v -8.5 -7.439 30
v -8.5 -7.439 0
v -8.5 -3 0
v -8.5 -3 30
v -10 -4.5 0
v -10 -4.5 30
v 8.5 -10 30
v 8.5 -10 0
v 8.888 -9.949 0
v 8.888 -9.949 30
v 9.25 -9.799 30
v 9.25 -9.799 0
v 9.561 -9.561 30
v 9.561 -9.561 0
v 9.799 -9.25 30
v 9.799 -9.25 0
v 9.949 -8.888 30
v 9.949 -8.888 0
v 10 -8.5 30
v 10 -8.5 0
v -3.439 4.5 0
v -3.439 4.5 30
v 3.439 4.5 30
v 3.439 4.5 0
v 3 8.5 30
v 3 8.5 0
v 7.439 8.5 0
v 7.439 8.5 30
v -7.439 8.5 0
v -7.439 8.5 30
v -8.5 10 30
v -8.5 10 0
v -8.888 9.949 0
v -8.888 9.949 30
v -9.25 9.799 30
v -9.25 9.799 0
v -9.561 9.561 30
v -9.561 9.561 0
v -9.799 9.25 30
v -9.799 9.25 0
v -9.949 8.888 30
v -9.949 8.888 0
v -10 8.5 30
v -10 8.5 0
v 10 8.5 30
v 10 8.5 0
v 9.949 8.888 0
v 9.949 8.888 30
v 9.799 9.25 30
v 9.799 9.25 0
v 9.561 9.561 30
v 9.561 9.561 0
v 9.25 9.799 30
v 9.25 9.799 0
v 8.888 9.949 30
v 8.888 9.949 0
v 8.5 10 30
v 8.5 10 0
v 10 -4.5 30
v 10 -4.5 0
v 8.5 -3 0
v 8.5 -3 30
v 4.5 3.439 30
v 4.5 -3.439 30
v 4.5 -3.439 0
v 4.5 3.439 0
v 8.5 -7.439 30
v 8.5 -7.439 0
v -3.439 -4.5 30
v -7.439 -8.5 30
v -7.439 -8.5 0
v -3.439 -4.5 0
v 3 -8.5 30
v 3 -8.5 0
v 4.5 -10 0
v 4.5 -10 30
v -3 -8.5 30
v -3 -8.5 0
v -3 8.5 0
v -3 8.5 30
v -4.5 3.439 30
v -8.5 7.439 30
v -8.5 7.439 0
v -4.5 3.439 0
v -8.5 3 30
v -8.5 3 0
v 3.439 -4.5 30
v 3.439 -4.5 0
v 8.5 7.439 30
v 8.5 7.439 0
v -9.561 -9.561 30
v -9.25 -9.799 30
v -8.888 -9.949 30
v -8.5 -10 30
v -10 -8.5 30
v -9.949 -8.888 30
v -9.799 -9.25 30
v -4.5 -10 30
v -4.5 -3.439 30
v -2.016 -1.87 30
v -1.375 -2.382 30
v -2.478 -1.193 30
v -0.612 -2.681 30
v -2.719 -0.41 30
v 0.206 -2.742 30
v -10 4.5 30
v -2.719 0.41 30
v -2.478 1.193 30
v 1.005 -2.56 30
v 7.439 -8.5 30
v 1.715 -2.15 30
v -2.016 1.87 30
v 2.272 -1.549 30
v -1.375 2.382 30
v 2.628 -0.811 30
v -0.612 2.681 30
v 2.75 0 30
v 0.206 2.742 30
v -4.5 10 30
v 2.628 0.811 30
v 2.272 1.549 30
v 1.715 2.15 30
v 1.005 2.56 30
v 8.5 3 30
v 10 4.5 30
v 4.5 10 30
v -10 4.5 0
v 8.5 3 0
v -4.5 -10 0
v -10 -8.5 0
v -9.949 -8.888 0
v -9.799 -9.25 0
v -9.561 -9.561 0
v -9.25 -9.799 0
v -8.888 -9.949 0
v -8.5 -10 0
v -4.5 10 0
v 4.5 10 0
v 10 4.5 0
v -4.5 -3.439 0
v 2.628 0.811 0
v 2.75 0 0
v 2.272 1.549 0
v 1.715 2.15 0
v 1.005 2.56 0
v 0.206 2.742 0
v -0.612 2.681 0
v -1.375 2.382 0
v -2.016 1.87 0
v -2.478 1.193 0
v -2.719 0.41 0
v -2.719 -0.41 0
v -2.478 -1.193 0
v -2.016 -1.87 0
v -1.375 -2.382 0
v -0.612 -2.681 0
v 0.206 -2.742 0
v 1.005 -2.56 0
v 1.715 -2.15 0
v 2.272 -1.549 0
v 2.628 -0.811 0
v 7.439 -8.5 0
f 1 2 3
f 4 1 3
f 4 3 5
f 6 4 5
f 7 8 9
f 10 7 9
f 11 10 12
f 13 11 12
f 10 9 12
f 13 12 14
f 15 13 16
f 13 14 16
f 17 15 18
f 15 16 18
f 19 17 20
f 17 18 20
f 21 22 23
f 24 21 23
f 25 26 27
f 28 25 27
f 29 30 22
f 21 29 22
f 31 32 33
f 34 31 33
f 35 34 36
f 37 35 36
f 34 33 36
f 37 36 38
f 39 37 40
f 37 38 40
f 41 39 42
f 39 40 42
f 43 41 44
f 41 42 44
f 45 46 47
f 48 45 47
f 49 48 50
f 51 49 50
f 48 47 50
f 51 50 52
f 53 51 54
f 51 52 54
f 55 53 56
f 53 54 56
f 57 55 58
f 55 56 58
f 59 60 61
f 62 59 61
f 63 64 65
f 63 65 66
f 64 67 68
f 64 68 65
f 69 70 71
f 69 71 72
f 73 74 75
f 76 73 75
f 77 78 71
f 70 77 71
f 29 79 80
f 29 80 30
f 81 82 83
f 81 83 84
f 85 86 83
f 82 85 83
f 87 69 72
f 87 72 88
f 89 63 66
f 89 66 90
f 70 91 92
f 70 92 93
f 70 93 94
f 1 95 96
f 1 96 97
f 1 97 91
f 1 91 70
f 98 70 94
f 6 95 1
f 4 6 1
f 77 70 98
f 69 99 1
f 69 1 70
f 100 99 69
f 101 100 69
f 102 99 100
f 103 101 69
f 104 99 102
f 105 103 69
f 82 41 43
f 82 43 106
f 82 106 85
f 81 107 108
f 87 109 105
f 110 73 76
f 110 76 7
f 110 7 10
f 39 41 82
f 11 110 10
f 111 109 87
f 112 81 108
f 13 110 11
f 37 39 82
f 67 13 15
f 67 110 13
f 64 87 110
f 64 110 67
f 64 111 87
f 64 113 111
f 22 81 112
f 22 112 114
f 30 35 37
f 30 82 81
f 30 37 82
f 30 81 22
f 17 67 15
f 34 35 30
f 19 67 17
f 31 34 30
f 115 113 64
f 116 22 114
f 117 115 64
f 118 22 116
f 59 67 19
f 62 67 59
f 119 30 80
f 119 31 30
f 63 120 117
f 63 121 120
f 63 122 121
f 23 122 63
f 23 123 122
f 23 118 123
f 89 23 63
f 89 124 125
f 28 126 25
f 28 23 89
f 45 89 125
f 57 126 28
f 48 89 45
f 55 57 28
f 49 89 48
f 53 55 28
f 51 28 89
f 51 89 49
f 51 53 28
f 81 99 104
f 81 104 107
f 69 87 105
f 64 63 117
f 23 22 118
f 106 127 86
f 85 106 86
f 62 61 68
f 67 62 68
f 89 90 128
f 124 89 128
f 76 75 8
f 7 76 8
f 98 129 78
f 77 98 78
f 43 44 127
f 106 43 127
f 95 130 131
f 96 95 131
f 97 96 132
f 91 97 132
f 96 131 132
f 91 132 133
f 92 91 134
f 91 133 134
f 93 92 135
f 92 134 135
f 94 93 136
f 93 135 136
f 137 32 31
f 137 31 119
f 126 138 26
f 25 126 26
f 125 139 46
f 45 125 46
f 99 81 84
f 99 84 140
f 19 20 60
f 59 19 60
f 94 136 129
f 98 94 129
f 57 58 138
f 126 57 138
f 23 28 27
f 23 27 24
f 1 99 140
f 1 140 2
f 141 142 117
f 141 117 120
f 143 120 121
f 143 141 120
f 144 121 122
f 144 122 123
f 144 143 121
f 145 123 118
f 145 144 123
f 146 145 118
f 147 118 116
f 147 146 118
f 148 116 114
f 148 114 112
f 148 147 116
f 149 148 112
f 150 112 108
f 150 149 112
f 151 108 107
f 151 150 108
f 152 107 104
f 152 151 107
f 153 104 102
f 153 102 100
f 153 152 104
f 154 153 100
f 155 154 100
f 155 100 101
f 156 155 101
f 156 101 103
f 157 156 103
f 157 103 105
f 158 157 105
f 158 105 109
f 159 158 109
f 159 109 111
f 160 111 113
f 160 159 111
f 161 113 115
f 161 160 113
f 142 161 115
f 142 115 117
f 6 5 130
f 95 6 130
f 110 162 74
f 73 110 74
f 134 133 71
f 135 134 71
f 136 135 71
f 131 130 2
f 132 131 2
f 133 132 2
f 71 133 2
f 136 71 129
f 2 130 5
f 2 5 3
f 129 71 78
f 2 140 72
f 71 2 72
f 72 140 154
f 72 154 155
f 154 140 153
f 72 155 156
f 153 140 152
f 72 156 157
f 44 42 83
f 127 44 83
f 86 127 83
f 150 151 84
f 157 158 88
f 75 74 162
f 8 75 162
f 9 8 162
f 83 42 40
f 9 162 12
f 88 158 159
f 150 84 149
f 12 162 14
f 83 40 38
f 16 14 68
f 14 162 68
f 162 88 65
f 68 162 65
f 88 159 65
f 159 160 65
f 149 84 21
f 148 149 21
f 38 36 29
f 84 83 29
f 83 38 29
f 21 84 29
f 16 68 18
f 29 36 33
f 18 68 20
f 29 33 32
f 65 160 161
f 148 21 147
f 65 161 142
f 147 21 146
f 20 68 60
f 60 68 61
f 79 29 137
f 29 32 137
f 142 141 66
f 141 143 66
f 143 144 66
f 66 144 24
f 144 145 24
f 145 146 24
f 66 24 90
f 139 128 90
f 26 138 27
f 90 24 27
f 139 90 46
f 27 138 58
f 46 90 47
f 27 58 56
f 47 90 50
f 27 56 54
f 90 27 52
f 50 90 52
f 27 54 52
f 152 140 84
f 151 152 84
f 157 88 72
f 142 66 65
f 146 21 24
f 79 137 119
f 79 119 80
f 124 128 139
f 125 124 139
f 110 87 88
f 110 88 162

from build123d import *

# Parameters (mm, degrees)
SKETCH_R  = 2.75
PAD_DEPTH = 30


with BuildPart() as part:
    # Sketch → Pad (new body)
    with BuildSketch(Plane.XY):
        with BuildLine():
            ThreePointArc((-8.5, 10), (-9.56066, 9.56066), (-10, 8.5))
            Line((-10, 8.5), (-10, 4.5))
            Line((-10, 4.5), (-8.5, 3))
            Line((-8.5, 3), (-8.5, 7.43934))
            Line((-8.5, 7.43934), (-4.5, 3.43934))
            Line((-4.5, 3.43934), (-4.5, -3.43934))
            Line((-4.5, -3.43934), (-8.5, -7.43934))
            Line((-8.5, -7.43934), (-8.5, -3))
            Line((-8.5, -3), (-10, -4.5))
            Line((-10, -4.5), (-10, -8.5))
            ThreePointArc((-10, -8.5), (-9.56066, -9.56066), (-8.5, -10))
            Line((-8.5, -10), (-4.5, -10))
            Line((-4.5, -10), (-3, -8.5))
            Line((-3, -8.5), (-7.43934, -8.5))
            Line((-7.43934, -8.5), (-3.43934, -4.5))
            Line((-3.43934, -4.5), (3.43934, -4.5))
            Line((3.43934, -4.5), (7.43934, -8.5))
            Line((7.43934, -8.5), (3, -8.5))
            Line((3, -8.5), (4.5, -10))
            Line((4.5, -10), (8.5, -10))
            ThreePointArc((8.5, -10), (9.56066, -9.56066), (10, -8.5))
            Line((10, -8.5), (10, -4.5))
            Line((10, -4.5), (8.5, -3))
            Line((8.5, -3), (8.5, -7.43934))
            Line((8.5, -7.43934), (4.5, -3.43934))
            Line((4.5, -3.43934), (4.5, 3.43934))
            Line((4.5, 3.43934), (8.5, 7.43934))
            Line((8.5, 7.43934), (8.5, 3))
            Line((8.5, 3), (10, 4.5))
            Line((10, 4.5), (10, 8.5))
            ThreePointArc((10, 8.5), (9.56066, 9.56066), (8.5, 10))
            Line((8.5, 10), (4.5, 10))
            Line((4.5, 10), (3, 8.5))
            Line((3, 8.5), (7.43934, 8.5))
            Line((7.43934, 8.5), (3.43934, 4.5))
            Line((-3.43934, 4.5), (3.43934, 4.5))
            Line((-7.43934, 8.5), (-3.43934, 4.5))
            Line((-3, 8.5), (-7.43934, 8.5))
            Line((-4.5, 10), (-3, 8.5))
            Line((-8.5, 10), (-4.5, 10))
        make_face()
        Circle(SKETCH_R, mode=Mode.SUBTRACT)
    extrude(amount=PAD_DEPTH)


solid = part.part
